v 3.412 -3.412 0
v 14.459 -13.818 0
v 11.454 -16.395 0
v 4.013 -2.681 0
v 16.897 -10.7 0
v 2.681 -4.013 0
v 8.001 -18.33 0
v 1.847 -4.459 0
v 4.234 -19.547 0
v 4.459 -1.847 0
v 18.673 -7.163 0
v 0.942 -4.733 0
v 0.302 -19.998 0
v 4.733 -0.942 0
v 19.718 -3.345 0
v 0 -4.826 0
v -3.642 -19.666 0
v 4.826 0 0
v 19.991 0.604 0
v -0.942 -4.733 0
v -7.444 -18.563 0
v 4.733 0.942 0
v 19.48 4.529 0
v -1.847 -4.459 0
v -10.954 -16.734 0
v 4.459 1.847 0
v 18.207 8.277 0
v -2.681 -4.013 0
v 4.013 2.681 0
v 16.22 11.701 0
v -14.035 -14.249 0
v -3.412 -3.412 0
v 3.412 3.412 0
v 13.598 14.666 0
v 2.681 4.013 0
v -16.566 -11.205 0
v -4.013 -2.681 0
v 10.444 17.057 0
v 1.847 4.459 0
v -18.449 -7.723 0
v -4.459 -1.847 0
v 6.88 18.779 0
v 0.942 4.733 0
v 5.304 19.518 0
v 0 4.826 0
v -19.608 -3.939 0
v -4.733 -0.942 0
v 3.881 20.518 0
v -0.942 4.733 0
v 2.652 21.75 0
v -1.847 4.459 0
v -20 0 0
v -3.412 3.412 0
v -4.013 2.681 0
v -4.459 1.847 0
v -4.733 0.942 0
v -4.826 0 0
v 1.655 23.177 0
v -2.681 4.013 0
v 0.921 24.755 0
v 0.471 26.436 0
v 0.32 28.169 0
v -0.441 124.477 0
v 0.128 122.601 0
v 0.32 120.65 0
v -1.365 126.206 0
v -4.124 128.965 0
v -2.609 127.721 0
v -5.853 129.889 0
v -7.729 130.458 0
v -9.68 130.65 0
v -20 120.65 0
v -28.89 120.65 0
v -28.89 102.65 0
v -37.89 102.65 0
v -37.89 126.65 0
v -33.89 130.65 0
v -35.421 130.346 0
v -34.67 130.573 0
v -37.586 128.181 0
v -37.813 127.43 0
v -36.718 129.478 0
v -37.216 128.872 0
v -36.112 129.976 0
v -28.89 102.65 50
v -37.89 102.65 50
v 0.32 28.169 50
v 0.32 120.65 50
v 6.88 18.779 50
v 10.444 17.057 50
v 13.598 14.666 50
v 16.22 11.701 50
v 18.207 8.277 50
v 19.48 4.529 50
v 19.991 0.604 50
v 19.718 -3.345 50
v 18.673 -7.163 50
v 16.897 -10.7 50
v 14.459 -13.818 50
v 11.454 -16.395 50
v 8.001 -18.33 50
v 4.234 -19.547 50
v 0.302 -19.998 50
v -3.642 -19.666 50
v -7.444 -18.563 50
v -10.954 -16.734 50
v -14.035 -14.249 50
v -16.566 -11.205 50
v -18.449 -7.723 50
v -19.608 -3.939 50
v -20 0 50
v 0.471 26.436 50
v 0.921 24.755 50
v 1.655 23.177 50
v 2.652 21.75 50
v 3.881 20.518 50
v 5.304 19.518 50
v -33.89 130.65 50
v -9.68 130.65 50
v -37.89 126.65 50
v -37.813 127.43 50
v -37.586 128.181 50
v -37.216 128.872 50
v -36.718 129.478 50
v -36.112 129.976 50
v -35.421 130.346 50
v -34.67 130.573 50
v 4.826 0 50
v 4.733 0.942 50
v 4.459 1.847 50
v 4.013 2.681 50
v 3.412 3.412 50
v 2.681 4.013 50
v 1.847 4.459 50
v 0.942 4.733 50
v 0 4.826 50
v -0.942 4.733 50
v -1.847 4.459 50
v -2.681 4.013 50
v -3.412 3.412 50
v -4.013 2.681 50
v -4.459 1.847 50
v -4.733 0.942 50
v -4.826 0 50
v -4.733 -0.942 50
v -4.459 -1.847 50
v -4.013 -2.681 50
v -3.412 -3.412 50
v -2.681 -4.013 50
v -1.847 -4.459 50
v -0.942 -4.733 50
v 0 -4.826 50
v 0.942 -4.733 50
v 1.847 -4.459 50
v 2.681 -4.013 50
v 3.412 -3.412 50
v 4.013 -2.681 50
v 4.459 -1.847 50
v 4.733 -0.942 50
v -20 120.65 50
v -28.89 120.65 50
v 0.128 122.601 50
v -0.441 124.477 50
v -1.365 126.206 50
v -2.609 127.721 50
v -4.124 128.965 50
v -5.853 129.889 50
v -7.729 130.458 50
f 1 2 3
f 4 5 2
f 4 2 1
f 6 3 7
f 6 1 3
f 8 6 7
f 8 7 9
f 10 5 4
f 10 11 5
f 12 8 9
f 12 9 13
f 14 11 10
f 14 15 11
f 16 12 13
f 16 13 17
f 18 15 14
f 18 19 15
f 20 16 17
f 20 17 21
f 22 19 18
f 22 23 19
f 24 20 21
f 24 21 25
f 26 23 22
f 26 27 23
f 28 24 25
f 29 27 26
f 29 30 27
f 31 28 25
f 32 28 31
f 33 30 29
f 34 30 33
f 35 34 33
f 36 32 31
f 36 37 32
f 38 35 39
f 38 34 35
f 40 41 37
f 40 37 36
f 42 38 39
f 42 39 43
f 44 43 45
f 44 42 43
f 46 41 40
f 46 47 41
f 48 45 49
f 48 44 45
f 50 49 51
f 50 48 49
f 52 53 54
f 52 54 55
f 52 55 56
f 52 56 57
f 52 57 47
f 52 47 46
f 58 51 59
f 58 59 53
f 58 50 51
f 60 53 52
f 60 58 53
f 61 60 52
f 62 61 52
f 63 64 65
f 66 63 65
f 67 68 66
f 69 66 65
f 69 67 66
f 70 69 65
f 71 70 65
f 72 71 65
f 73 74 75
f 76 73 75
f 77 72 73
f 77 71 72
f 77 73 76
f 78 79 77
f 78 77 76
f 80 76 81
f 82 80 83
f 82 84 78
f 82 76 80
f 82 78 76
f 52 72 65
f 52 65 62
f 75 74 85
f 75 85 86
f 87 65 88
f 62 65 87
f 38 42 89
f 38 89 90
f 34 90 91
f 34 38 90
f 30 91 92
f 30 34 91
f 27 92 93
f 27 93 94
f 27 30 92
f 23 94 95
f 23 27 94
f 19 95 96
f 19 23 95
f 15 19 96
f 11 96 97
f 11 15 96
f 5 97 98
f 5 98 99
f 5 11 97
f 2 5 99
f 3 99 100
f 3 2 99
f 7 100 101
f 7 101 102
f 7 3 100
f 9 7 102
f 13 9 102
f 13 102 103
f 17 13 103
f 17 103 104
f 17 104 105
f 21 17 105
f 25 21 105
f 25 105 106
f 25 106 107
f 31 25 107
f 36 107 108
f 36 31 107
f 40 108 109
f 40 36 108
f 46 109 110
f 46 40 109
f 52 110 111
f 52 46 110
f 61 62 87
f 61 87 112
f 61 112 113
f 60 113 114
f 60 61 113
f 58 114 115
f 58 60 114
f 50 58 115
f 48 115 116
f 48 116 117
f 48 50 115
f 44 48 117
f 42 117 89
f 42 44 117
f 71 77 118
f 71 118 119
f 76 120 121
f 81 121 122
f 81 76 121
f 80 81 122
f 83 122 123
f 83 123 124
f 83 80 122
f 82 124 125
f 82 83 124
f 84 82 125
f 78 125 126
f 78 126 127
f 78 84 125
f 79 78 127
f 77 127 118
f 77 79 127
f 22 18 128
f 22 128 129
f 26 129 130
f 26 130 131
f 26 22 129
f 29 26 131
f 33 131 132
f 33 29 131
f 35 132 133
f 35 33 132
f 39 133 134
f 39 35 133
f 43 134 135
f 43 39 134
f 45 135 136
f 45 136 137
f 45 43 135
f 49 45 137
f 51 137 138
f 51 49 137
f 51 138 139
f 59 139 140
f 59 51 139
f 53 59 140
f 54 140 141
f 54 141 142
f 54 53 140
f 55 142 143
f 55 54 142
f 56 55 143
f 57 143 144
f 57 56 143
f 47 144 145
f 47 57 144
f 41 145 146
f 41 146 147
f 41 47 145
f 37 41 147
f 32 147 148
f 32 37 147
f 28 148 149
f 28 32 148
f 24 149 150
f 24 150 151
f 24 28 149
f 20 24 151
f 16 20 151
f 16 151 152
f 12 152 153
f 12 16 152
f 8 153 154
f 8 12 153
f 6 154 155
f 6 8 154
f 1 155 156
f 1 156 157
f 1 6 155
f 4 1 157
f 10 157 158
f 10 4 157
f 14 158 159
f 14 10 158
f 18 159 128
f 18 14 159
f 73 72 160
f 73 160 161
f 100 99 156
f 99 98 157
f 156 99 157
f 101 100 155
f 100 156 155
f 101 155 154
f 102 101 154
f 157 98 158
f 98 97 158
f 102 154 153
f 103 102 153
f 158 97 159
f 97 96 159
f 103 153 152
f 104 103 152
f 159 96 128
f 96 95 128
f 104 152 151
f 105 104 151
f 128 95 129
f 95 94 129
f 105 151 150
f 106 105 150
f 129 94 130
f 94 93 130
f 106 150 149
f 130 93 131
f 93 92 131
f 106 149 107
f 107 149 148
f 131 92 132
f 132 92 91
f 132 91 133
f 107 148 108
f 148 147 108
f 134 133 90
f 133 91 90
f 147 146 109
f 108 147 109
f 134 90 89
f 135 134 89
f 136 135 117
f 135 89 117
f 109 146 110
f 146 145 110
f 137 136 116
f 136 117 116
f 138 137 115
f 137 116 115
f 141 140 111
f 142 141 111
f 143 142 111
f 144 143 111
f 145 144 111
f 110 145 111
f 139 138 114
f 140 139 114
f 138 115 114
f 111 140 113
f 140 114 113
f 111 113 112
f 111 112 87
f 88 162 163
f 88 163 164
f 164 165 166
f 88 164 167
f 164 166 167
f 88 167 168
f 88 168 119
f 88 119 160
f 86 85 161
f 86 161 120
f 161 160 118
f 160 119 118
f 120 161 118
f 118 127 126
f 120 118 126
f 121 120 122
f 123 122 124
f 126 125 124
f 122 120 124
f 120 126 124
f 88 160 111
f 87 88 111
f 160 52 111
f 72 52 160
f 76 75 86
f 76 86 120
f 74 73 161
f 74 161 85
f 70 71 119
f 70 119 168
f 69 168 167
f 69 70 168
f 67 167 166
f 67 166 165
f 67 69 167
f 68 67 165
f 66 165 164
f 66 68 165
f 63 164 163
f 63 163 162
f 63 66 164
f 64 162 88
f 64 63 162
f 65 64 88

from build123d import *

# Parameters (mm, degrees)
SKETCH1_R           = 4.826
BOSS_EXTRUDE1_DEPTH = 50


with BuildPart() as part:
    # Sketch1 → Boss-Extrude1 (new body)
    with BuildSketch(Plane.XY):
        with BuildLine():
            Line((-20, 120.65), (-28.89, 120.65))
            Line((-28.89, 120.65), (-28.89, 102.65))
            Line((-28.89, 102.65), (-37.89, 102.65))
            Line((-37.89, 102.65), (-37.89, 126.65))
            ThreePointArc((-37.89, 126.65), (-36.718427125, 129.478427125), (-33.89, 130.65))
            Line((-33.89, 130.65), (-9.68, 130.65))
            ThreePointArc((-9.68, 130.65), (-2.608932188, 127.721067812), (0.32, 120.65))
            Line((0.32, 120.65), (0.32, 28.169089442))
            ThreePointArc((0.32, 28.169089442), (2.122439387, 22.441961017), (6.88, 18.779392961))
            ThreePointArc((6.88, 18.779392961), (11.454256851, -16.395121226), (-20, 0))
            Line((-20, 0), (-20, 120.65))
        make_face()
        Circle(SKETCH1_R, mode=Mode.SUBTRACT)
    extrude(amount=BOSS_EXTRUDE1_DEPTH)


solid = part.part
